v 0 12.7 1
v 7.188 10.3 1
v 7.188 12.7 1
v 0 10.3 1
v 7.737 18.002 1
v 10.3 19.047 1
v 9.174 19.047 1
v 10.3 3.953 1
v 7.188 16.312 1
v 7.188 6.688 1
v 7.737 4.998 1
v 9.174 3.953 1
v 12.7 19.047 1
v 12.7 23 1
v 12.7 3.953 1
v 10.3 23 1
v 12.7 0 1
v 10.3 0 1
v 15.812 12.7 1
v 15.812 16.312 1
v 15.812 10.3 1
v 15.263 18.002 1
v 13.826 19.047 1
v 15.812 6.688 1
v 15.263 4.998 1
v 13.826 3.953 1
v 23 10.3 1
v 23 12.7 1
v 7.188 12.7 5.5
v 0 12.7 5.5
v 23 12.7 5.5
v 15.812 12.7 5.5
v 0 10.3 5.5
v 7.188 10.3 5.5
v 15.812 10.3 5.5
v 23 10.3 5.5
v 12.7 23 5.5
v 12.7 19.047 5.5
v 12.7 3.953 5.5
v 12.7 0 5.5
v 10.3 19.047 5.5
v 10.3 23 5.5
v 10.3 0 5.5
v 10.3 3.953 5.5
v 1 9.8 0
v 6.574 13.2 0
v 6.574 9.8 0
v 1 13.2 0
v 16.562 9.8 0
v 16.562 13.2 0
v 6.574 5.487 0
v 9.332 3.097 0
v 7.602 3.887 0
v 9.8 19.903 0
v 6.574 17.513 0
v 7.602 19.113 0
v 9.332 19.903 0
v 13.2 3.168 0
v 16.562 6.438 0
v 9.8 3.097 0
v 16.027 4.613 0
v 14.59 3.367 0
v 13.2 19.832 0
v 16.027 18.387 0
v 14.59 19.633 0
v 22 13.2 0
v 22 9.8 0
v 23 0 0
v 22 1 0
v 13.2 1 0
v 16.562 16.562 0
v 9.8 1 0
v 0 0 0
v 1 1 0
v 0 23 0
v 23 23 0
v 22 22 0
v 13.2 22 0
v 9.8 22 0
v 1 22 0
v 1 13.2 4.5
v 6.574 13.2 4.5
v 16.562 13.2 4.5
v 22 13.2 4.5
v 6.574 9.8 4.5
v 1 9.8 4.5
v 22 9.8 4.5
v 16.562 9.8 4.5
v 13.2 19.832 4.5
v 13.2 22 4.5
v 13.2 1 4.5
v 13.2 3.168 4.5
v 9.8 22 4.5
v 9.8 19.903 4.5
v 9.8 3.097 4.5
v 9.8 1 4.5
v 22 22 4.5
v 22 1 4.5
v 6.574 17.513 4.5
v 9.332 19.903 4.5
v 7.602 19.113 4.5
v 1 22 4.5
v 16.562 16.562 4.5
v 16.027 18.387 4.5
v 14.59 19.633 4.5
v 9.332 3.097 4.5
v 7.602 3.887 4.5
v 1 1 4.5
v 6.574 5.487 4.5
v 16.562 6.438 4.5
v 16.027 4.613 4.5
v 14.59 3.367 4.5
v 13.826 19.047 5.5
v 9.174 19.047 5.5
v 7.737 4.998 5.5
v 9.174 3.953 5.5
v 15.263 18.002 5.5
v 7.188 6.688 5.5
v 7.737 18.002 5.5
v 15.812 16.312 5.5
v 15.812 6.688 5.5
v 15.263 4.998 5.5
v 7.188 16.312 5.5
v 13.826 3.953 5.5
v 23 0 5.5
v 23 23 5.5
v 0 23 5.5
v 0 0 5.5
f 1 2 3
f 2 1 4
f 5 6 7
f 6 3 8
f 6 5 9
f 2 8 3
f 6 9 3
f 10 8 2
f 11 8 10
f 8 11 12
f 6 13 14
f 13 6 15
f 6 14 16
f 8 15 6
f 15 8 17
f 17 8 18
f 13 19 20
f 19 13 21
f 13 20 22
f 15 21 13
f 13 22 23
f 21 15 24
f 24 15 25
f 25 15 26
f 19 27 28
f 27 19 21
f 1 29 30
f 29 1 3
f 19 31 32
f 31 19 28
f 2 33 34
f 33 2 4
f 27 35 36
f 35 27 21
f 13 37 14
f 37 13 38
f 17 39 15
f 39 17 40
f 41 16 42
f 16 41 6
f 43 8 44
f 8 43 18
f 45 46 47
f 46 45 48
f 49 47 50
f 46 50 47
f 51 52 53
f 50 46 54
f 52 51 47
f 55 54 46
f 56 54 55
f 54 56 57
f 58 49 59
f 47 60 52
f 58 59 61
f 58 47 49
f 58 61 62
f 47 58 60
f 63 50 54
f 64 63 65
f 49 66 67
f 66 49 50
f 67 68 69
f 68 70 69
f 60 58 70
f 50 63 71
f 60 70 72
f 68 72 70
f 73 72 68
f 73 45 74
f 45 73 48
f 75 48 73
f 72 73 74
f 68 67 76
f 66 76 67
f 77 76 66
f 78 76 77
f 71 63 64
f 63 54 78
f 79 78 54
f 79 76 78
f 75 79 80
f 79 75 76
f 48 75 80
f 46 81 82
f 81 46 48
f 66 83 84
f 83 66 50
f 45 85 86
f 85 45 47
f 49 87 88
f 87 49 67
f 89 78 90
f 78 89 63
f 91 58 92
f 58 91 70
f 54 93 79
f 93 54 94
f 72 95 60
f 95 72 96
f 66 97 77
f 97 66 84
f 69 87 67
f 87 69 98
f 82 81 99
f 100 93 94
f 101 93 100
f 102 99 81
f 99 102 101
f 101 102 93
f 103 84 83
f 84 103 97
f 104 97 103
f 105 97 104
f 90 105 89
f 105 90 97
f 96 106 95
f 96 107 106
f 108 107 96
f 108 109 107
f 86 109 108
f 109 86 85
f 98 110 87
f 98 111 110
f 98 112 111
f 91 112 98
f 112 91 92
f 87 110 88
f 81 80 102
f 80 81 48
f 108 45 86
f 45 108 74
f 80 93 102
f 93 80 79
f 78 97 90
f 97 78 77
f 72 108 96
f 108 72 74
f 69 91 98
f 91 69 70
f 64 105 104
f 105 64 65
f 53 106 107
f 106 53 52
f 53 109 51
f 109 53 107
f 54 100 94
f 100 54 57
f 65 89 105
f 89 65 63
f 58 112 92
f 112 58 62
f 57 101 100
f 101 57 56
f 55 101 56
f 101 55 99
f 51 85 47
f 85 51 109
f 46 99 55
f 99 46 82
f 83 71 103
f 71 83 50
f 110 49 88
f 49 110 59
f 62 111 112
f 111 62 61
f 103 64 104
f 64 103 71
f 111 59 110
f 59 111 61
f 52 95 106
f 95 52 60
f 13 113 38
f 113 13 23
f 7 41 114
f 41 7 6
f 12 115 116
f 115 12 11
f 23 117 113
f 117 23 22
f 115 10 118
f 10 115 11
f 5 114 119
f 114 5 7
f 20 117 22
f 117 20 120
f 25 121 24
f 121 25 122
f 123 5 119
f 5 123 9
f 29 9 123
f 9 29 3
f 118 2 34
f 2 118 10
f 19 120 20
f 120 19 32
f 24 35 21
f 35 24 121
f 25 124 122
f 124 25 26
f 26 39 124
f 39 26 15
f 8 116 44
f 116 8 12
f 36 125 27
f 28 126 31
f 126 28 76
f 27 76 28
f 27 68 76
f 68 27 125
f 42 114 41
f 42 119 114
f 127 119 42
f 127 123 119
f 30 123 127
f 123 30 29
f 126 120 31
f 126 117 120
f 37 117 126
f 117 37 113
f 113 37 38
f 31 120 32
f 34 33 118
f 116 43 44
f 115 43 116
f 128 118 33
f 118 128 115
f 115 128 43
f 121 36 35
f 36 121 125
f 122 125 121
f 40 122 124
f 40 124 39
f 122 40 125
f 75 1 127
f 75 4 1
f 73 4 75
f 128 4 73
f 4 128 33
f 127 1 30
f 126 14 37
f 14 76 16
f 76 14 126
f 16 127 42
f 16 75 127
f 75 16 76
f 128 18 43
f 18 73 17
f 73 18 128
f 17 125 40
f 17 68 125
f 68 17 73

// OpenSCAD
module pill_cutter_hole( width, length, height, wall_width ) {
    
    x = width;
    y = length;
    radius = width / 2;
    
    linear_extrude( height = height + (2 * wall_width) ) {
        hull() {
            translate([(-x/2)+(radius/2), (-y/2)+(radius/2), 0]) {
                circle( r=radius );
            }

            translate([(x/2)-(radius/2), (-y/2)+(radius/2), 0]) {
                circle( r=radius );
            }

            translate([(-x/2)+(radius/2), (y/2)-(radius/2), 0]) {
                circle( r=radius );
            }

            translate([(x/2)-(radius/2), (y/2)-(radius/2), 0]) {
                circle( r=radius );
            }
        }
    }
}

module pill_cutter_divots( tray_width, tray_length, tray_height, width ) {
    
    w_x = (tray_width / 2) - (width / 2);
    h_y = (tray_length / 2) - (width / 2);
    
    union() {
        translate( [-0.5, h_y, 0] ) {
            cube( [tray_width + 1, width, tray_height] );
        }
        translate( [w_x, -0.5, 0] ) {
            cube( [width, tray_length + 1, tray_height] );
        }
    }
}

module pill_cutter_bottom( width, length, height, divot_width, hole_width, hole_length, hole_x, hole_y, wall_width ) {
    difference() {
        translate( [wall_width, wall_width, -1 * wall_width] ) {
            cube( [
                width - (2 * wall_width),
                length - (2 * wall_width),
                height
            ] );
        }
        pill_cutter_divots(
            width, length, height,
            divot_width + wall_width
        );
        translate( [hole_x, hole_y] ) {
            pill_cutter_hole( hole_width + 1, hole_length + 1, height );
        }
    }
}

module pill_cutter_tray( width, length, height, divot_width, hole_width, hole_length, wall_width ) {
    
    hole_x = width / 2;
    hole_y = length / 2;
    
    difference() {
        cube( [width, length, height] );
        union() {
            translate( [0, 0, wall_width] ) {
                pill_cutter_divots( width, length, height, divot_width);
            }
            translate( [hole_x, hole_y, wall_width] ) {
                pill_cutter_hole( hole_width, hole_length, height - wall_width );
            }
            pill_cutter_bottom( width, length, height, divot_width, hole_width, hole_length, hole_x, hole_y, wall_width );
        }
    }
}

pill_cutter_tray( 23, 23, 5.5, 2.4, 5.75, 12.5, 1 );
//pill_cutter_tray( 8, 8 );
